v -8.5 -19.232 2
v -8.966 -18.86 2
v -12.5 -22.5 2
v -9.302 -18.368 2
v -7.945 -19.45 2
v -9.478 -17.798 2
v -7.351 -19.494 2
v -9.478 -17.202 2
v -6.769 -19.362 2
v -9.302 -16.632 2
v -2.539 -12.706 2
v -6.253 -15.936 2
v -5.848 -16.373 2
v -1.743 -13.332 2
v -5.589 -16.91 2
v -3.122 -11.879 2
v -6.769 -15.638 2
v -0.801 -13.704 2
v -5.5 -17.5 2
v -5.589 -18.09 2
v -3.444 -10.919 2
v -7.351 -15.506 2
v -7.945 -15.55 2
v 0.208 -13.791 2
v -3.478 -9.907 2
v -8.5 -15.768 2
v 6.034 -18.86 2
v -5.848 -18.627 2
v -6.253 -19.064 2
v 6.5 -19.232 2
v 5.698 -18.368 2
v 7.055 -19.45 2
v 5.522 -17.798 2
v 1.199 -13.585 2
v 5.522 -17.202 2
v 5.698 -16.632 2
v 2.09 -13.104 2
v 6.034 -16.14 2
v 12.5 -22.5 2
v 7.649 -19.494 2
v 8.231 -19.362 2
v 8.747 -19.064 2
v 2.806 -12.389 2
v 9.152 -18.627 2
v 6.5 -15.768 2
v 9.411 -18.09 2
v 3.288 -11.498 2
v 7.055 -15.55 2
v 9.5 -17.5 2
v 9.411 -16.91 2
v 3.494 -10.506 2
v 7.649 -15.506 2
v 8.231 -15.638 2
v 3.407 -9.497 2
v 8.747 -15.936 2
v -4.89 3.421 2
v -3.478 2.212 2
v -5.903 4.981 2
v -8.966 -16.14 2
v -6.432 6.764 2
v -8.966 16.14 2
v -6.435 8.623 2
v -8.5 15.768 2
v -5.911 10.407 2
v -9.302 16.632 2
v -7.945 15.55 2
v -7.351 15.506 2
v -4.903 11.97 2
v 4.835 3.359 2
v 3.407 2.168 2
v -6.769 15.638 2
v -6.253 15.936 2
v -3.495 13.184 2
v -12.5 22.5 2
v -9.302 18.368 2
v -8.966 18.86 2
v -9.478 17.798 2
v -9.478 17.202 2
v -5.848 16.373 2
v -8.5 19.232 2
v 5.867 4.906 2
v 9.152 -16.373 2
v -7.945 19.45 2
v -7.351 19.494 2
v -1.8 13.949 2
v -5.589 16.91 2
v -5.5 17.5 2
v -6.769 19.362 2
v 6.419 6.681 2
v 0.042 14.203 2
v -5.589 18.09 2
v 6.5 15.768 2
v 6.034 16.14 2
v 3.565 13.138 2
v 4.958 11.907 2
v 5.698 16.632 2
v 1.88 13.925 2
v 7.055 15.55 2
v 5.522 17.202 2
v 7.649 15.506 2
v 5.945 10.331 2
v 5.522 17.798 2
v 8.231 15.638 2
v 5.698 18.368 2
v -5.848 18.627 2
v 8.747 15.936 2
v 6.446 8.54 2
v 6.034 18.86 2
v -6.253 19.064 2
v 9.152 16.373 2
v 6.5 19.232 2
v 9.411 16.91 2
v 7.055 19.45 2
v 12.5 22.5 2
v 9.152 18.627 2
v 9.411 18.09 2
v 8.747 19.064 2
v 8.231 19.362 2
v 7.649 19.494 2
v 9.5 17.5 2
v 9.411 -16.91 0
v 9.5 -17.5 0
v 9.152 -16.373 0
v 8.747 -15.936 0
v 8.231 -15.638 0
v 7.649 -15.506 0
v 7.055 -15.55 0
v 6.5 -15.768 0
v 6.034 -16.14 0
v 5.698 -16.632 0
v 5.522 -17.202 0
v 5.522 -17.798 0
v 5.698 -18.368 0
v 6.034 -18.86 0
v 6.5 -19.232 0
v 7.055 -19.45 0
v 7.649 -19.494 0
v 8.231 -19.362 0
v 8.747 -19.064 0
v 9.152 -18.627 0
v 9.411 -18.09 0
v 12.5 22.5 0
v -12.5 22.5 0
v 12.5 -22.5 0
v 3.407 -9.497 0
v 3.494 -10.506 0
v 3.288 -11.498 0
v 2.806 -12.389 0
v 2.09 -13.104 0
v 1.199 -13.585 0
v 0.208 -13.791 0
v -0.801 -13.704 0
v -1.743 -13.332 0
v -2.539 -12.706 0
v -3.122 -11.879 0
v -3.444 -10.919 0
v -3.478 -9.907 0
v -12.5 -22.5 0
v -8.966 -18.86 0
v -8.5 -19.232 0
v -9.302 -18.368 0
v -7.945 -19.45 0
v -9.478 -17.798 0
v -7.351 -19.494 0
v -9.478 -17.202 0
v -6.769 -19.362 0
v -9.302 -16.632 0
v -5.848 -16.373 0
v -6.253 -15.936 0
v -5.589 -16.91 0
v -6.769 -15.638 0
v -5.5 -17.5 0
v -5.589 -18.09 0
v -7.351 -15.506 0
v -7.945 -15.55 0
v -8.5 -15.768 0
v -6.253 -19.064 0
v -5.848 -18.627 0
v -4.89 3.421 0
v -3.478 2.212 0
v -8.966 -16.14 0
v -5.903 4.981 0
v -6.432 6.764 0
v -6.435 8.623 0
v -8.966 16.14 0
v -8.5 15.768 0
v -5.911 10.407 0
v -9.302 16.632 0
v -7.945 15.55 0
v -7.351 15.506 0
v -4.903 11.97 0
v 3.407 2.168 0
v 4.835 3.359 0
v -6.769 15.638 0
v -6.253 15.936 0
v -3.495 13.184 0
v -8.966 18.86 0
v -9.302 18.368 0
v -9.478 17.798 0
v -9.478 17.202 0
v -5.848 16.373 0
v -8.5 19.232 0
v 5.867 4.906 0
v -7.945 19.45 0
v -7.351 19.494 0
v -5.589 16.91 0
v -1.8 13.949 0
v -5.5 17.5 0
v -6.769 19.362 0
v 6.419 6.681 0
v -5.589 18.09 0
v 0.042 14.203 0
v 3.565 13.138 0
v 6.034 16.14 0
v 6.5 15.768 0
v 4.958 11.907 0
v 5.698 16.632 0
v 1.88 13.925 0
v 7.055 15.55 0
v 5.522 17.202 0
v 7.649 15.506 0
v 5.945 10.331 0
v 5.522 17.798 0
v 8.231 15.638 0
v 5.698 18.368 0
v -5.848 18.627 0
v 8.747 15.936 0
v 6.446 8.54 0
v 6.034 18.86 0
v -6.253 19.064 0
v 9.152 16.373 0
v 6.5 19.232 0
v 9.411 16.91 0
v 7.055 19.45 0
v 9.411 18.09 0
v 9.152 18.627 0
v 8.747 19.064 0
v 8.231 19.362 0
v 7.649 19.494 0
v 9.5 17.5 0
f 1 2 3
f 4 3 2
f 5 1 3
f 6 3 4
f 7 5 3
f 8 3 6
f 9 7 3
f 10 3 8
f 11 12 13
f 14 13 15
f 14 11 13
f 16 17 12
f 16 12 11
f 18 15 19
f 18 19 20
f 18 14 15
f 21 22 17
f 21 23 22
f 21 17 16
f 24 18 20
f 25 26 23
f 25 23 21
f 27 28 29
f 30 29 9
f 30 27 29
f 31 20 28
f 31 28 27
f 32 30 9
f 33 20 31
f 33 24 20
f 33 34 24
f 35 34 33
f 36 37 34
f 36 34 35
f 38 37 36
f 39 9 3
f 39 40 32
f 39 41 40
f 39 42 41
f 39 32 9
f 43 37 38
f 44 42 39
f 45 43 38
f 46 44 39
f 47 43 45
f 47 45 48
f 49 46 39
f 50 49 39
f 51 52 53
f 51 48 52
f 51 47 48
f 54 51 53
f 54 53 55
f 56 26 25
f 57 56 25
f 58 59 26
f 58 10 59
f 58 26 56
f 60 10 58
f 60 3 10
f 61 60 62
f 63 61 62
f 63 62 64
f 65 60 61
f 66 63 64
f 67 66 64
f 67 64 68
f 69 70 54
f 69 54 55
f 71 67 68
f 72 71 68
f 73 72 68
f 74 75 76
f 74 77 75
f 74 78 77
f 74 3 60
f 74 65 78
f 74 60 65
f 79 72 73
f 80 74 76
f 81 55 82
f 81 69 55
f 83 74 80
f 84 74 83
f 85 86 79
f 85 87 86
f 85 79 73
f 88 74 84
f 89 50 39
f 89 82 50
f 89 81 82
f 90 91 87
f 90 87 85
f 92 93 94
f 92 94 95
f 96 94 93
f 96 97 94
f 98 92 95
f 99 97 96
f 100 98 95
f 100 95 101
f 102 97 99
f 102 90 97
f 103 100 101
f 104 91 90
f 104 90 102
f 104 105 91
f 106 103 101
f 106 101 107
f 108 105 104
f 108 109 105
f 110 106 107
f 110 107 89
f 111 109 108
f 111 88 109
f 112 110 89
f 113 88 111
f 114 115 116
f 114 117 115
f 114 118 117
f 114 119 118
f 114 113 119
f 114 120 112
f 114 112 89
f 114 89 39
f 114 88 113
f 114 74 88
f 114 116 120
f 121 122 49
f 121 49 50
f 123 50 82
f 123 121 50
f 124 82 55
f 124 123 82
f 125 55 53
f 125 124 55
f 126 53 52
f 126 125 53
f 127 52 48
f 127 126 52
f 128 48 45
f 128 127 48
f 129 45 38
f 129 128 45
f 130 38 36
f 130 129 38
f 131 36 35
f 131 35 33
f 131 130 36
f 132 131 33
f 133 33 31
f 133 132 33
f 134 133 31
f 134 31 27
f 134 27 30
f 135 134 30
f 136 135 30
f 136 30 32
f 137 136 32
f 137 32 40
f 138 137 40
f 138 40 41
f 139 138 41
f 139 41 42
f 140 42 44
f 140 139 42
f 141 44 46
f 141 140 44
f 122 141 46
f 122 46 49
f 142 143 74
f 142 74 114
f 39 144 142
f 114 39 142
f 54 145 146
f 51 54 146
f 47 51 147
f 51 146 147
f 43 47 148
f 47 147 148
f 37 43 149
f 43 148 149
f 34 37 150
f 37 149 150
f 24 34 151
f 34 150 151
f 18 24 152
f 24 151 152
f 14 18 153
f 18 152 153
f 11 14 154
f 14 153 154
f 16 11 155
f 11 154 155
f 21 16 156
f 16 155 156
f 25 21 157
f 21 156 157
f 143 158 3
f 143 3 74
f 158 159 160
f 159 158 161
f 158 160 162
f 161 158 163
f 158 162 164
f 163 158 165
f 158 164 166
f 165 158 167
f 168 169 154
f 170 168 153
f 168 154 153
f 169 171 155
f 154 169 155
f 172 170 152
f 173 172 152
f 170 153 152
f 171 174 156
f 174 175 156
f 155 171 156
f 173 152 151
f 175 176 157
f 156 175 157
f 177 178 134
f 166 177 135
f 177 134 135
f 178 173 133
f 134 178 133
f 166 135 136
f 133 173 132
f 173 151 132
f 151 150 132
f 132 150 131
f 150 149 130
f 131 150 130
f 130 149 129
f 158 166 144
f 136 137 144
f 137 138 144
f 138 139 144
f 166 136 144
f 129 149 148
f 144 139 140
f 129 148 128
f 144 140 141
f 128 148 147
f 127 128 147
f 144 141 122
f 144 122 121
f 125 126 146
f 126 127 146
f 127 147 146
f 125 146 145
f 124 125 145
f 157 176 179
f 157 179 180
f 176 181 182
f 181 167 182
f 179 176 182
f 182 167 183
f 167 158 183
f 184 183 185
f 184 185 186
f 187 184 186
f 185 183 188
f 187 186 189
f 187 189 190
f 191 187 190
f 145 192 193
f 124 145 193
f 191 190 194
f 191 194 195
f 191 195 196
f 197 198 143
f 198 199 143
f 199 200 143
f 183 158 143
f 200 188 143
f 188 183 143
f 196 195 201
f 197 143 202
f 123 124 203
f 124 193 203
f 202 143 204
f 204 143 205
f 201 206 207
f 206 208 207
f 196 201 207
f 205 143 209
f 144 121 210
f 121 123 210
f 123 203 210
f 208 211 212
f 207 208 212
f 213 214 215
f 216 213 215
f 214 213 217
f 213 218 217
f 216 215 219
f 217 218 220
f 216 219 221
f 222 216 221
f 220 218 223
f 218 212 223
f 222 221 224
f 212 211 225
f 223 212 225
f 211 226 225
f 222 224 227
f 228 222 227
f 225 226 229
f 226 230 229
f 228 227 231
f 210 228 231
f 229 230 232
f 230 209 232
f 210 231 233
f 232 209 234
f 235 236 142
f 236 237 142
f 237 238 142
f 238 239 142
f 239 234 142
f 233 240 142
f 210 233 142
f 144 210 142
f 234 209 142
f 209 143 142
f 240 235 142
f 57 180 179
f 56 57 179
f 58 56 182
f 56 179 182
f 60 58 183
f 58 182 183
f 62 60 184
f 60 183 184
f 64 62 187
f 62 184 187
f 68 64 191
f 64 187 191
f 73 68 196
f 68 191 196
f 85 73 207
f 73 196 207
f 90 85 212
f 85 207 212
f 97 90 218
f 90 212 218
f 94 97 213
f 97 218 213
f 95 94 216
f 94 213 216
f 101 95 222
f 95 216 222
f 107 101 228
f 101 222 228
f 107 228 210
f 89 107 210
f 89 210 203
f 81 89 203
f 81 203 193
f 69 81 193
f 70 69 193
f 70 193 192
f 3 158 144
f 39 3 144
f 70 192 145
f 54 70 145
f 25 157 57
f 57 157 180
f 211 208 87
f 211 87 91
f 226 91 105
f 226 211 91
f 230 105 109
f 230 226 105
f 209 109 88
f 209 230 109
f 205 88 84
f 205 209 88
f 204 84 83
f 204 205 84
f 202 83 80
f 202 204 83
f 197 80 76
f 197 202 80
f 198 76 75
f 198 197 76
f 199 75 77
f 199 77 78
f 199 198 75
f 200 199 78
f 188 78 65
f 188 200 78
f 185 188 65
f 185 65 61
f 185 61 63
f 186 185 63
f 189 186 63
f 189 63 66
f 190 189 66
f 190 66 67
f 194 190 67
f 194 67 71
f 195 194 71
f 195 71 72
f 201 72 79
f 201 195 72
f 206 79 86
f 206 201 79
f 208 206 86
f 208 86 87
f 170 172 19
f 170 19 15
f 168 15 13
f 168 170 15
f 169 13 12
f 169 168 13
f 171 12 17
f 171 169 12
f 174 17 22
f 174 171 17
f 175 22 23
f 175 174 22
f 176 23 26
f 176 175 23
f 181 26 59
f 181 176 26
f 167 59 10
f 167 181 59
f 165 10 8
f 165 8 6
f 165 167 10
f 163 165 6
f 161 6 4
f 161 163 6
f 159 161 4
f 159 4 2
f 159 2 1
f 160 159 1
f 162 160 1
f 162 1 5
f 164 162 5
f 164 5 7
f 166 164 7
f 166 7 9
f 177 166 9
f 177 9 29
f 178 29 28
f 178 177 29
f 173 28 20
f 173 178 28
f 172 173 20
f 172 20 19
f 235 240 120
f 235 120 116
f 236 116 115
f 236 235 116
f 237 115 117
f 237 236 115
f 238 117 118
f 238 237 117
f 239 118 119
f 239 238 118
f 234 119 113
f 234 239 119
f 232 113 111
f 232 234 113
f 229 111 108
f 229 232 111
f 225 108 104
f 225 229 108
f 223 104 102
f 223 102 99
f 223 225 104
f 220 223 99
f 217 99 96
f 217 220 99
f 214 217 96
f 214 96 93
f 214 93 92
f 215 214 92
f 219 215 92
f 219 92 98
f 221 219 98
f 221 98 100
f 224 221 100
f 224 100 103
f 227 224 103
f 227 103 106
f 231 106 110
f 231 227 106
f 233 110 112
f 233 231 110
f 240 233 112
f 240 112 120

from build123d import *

# Parameters (mm, degrees)
F0_W     = 25
F0_H     = 45
F0_R     = 2
F1_DEPTH = 2


with BuildPart() as f1:
    # F0 (on Top) → F1 (new body)
    with BuildSketch(Plane.XY):
        Rectangle(F0_W, F0_H)
        with Locations((-7.5, -17.5)):
            Circle(F0_R, mode=Mode.SUBTRACT)
        with Locations((7.5, -17.5)):
            Circle(F0_R, mode=Mode.SUBTRACT)
        with Locations((-7.5, 17.5)):
            Circle(F0_R, mode=Mode.SUBTRACT)
        with BuildLine():
            ThreePointArc((-3.478162, 2.211919), (0.041681, 14.202904), (3.407455, 2.167764))
            Line((3.407455, 2.167764), (3.407455, -9.497431))
            ThreePointArc((3.407455, -9.497431), (0.207613, -13.790799), (-3.478162, -9.906592))
            Line((-3.478162, -9.906592), (-3.478162, 2.211919))
        make_face(mode=Mode.SUBTRACT)
        with Locations((7.5, 17.5)):
            Circle(F0_R, mode=Mode.SUBTRACT)
    extrude(amount=F1_DEPTH)


solid = f1.part
